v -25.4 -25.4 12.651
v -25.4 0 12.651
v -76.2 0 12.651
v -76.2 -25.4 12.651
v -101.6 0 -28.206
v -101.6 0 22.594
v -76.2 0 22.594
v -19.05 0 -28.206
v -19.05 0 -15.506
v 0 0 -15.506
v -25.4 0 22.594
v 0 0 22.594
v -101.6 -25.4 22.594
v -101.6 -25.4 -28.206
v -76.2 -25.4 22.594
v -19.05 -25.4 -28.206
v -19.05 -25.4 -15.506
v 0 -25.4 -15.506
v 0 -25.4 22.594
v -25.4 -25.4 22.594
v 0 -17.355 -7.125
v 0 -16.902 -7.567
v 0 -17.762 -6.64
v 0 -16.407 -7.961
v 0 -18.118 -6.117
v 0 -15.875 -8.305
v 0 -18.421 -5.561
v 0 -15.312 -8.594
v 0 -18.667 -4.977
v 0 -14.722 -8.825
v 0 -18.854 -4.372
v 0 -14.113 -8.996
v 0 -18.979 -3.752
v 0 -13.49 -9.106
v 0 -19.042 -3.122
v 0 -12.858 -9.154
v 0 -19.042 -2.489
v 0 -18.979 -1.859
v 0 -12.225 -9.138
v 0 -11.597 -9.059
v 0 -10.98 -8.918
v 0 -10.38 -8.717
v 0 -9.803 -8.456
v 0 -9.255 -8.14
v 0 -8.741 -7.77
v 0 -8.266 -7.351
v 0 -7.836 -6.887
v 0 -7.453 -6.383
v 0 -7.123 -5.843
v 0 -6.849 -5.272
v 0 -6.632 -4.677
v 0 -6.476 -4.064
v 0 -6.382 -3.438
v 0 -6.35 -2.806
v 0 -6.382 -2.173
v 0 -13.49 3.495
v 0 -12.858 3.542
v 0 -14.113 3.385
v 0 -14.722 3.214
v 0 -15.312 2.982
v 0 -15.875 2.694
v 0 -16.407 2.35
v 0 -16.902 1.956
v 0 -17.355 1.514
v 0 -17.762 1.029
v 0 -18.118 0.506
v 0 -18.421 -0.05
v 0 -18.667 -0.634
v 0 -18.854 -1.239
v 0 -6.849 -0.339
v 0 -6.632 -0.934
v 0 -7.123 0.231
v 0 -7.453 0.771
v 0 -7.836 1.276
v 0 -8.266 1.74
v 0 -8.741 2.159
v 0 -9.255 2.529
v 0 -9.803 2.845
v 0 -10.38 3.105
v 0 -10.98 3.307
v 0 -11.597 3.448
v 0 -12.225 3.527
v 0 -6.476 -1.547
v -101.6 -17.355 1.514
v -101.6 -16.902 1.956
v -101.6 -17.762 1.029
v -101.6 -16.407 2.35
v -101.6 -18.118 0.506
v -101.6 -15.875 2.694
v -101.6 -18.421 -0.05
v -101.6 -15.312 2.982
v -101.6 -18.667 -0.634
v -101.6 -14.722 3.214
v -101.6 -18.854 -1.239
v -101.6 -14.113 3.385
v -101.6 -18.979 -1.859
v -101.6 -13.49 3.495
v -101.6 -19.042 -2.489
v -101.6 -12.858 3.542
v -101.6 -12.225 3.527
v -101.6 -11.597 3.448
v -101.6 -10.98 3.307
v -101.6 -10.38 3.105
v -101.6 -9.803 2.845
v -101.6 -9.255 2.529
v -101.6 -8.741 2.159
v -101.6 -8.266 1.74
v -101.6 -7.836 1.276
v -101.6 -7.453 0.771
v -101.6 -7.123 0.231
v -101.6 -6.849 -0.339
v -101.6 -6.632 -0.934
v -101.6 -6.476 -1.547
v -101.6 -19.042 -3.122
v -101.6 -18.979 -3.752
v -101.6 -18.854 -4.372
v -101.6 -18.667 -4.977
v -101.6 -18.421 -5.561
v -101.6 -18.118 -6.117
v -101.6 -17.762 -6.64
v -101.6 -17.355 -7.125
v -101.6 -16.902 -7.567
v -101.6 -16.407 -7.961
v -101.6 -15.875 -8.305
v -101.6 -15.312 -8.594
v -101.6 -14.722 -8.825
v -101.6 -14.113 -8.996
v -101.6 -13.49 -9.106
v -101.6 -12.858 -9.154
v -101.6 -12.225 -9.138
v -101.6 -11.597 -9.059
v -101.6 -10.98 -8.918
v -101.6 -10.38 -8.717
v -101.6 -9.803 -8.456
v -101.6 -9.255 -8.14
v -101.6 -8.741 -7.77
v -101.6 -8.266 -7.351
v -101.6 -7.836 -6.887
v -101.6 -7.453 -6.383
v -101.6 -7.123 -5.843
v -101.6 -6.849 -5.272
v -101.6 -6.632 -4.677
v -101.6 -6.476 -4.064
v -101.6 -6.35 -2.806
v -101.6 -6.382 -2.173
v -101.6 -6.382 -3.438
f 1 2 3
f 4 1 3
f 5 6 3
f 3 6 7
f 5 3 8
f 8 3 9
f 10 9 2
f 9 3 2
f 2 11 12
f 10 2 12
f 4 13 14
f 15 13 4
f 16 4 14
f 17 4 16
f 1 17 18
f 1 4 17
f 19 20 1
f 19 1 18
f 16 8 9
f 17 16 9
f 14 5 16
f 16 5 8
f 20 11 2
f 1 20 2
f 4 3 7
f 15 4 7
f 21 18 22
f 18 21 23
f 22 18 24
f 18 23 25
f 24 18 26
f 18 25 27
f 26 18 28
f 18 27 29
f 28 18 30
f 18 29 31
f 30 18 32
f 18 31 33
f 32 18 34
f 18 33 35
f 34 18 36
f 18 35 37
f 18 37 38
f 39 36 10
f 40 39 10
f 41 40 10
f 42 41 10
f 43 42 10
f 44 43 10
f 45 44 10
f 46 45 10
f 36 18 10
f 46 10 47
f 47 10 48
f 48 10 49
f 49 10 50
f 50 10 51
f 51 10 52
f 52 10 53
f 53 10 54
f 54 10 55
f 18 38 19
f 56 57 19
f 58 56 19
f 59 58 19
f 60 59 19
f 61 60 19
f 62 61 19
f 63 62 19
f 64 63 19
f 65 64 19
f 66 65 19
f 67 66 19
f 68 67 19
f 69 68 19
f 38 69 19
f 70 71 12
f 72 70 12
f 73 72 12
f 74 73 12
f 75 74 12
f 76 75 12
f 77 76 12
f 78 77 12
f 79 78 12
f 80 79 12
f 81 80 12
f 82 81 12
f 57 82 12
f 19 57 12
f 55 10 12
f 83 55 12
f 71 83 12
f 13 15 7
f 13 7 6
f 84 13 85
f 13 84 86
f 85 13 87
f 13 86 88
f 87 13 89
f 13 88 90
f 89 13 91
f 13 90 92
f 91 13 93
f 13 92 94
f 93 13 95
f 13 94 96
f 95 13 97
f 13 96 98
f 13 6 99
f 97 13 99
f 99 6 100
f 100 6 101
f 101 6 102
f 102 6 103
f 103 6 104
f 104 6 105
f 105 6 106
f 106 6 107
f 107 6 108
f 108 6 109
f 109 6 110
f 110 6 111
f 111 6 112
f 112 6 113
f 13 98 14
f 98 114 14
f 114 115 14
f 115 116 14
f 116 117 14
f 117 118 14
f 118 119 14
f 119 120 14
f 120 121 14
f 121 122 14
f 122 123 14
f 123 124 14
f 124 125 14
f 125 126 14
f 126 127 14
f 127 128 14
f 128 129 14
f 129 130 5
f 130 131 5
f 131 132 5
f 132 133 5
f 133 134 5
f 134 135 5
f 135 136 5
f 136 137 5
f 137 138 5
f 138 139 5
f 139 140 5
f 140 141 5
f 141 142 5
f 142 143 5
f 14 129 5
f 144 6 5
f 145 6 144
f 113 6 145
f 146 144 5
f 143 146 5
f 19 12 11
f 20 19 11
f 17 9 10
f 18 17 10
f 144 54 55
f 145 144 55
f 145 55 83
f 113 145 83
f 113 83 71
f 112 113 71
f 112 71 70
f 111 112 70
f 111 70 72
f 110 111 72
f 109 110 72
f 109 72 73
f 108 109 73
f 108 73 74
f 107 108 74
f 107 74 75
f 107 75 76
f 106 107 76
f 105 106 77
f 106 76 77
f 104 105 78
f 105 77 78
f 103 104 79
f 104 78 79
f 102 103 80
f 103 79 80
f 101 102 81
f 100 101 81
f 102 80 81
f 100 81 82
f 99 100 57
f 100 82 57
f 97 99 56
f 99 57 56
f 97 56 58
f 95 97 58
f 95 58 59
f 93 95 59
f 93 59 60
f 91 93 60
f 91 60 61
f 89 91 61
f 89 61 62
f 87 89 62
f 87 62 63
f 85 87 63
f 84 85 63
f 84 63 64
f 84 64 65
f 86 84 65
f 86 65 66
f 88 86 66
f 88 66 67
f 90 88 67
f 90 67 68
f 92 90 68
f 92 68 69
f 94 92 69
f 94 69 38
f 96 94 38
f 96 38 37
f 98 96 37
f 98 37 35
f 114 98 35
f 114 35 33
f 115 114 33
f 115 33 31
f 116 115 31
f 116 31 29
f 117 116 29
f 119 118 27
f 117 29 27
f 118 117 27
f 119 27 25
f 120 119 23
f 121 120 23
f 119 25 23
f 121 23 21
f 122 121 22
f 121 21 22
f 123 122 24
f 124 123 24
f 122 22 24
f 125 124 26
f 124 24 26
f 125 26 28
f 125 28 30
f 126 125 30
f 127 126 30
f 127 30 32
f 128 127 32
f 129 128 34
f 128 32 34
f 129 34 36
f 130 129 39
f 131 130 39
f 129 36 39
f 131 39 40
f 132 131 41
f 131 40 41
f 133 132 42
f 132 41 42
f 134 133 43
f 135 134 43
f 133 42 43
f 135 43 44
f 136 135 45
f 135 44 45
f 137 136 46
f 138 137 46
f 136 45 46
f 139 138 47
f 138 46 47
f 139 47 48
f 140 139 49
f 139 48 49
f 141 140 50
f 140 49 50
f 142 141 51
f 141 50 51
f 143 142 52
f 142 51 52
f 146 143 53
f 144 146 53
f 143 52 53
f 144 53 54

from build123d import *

# Parameters (mm, degrees)
F1_DEPTH = 25.4
F2_R     = 6.35
F3_DEPTH = 101.601


with BuildPart() as f1:
    # F0 (on Front) → F1 (new body)
    with BuildSketch(Plane.XZ):
        Polygon((-76.2, 22.59441), (-101.6, 22.59441), (-101.6, -28.20559), (-19.05, -28.20559), (-19.05, -15.50559), (0, -15.50559), (0, 22.59441), (-25.4, 22.59441), (-25.4, 12.650757), (-76.2, 12.650757), align=None)
    extrude(amount=F1_DEPTH)

    # F2 (on Right) → F3 (cut, through all)
    with BuildSketch(Plane.YZ):
        with Locations((-12.7, -2.80559)):
            Circle(F2_R)
    extrude(amount=-F3_DEPTH, mode=Mode.SUBTRACT)


solid = f1.part
